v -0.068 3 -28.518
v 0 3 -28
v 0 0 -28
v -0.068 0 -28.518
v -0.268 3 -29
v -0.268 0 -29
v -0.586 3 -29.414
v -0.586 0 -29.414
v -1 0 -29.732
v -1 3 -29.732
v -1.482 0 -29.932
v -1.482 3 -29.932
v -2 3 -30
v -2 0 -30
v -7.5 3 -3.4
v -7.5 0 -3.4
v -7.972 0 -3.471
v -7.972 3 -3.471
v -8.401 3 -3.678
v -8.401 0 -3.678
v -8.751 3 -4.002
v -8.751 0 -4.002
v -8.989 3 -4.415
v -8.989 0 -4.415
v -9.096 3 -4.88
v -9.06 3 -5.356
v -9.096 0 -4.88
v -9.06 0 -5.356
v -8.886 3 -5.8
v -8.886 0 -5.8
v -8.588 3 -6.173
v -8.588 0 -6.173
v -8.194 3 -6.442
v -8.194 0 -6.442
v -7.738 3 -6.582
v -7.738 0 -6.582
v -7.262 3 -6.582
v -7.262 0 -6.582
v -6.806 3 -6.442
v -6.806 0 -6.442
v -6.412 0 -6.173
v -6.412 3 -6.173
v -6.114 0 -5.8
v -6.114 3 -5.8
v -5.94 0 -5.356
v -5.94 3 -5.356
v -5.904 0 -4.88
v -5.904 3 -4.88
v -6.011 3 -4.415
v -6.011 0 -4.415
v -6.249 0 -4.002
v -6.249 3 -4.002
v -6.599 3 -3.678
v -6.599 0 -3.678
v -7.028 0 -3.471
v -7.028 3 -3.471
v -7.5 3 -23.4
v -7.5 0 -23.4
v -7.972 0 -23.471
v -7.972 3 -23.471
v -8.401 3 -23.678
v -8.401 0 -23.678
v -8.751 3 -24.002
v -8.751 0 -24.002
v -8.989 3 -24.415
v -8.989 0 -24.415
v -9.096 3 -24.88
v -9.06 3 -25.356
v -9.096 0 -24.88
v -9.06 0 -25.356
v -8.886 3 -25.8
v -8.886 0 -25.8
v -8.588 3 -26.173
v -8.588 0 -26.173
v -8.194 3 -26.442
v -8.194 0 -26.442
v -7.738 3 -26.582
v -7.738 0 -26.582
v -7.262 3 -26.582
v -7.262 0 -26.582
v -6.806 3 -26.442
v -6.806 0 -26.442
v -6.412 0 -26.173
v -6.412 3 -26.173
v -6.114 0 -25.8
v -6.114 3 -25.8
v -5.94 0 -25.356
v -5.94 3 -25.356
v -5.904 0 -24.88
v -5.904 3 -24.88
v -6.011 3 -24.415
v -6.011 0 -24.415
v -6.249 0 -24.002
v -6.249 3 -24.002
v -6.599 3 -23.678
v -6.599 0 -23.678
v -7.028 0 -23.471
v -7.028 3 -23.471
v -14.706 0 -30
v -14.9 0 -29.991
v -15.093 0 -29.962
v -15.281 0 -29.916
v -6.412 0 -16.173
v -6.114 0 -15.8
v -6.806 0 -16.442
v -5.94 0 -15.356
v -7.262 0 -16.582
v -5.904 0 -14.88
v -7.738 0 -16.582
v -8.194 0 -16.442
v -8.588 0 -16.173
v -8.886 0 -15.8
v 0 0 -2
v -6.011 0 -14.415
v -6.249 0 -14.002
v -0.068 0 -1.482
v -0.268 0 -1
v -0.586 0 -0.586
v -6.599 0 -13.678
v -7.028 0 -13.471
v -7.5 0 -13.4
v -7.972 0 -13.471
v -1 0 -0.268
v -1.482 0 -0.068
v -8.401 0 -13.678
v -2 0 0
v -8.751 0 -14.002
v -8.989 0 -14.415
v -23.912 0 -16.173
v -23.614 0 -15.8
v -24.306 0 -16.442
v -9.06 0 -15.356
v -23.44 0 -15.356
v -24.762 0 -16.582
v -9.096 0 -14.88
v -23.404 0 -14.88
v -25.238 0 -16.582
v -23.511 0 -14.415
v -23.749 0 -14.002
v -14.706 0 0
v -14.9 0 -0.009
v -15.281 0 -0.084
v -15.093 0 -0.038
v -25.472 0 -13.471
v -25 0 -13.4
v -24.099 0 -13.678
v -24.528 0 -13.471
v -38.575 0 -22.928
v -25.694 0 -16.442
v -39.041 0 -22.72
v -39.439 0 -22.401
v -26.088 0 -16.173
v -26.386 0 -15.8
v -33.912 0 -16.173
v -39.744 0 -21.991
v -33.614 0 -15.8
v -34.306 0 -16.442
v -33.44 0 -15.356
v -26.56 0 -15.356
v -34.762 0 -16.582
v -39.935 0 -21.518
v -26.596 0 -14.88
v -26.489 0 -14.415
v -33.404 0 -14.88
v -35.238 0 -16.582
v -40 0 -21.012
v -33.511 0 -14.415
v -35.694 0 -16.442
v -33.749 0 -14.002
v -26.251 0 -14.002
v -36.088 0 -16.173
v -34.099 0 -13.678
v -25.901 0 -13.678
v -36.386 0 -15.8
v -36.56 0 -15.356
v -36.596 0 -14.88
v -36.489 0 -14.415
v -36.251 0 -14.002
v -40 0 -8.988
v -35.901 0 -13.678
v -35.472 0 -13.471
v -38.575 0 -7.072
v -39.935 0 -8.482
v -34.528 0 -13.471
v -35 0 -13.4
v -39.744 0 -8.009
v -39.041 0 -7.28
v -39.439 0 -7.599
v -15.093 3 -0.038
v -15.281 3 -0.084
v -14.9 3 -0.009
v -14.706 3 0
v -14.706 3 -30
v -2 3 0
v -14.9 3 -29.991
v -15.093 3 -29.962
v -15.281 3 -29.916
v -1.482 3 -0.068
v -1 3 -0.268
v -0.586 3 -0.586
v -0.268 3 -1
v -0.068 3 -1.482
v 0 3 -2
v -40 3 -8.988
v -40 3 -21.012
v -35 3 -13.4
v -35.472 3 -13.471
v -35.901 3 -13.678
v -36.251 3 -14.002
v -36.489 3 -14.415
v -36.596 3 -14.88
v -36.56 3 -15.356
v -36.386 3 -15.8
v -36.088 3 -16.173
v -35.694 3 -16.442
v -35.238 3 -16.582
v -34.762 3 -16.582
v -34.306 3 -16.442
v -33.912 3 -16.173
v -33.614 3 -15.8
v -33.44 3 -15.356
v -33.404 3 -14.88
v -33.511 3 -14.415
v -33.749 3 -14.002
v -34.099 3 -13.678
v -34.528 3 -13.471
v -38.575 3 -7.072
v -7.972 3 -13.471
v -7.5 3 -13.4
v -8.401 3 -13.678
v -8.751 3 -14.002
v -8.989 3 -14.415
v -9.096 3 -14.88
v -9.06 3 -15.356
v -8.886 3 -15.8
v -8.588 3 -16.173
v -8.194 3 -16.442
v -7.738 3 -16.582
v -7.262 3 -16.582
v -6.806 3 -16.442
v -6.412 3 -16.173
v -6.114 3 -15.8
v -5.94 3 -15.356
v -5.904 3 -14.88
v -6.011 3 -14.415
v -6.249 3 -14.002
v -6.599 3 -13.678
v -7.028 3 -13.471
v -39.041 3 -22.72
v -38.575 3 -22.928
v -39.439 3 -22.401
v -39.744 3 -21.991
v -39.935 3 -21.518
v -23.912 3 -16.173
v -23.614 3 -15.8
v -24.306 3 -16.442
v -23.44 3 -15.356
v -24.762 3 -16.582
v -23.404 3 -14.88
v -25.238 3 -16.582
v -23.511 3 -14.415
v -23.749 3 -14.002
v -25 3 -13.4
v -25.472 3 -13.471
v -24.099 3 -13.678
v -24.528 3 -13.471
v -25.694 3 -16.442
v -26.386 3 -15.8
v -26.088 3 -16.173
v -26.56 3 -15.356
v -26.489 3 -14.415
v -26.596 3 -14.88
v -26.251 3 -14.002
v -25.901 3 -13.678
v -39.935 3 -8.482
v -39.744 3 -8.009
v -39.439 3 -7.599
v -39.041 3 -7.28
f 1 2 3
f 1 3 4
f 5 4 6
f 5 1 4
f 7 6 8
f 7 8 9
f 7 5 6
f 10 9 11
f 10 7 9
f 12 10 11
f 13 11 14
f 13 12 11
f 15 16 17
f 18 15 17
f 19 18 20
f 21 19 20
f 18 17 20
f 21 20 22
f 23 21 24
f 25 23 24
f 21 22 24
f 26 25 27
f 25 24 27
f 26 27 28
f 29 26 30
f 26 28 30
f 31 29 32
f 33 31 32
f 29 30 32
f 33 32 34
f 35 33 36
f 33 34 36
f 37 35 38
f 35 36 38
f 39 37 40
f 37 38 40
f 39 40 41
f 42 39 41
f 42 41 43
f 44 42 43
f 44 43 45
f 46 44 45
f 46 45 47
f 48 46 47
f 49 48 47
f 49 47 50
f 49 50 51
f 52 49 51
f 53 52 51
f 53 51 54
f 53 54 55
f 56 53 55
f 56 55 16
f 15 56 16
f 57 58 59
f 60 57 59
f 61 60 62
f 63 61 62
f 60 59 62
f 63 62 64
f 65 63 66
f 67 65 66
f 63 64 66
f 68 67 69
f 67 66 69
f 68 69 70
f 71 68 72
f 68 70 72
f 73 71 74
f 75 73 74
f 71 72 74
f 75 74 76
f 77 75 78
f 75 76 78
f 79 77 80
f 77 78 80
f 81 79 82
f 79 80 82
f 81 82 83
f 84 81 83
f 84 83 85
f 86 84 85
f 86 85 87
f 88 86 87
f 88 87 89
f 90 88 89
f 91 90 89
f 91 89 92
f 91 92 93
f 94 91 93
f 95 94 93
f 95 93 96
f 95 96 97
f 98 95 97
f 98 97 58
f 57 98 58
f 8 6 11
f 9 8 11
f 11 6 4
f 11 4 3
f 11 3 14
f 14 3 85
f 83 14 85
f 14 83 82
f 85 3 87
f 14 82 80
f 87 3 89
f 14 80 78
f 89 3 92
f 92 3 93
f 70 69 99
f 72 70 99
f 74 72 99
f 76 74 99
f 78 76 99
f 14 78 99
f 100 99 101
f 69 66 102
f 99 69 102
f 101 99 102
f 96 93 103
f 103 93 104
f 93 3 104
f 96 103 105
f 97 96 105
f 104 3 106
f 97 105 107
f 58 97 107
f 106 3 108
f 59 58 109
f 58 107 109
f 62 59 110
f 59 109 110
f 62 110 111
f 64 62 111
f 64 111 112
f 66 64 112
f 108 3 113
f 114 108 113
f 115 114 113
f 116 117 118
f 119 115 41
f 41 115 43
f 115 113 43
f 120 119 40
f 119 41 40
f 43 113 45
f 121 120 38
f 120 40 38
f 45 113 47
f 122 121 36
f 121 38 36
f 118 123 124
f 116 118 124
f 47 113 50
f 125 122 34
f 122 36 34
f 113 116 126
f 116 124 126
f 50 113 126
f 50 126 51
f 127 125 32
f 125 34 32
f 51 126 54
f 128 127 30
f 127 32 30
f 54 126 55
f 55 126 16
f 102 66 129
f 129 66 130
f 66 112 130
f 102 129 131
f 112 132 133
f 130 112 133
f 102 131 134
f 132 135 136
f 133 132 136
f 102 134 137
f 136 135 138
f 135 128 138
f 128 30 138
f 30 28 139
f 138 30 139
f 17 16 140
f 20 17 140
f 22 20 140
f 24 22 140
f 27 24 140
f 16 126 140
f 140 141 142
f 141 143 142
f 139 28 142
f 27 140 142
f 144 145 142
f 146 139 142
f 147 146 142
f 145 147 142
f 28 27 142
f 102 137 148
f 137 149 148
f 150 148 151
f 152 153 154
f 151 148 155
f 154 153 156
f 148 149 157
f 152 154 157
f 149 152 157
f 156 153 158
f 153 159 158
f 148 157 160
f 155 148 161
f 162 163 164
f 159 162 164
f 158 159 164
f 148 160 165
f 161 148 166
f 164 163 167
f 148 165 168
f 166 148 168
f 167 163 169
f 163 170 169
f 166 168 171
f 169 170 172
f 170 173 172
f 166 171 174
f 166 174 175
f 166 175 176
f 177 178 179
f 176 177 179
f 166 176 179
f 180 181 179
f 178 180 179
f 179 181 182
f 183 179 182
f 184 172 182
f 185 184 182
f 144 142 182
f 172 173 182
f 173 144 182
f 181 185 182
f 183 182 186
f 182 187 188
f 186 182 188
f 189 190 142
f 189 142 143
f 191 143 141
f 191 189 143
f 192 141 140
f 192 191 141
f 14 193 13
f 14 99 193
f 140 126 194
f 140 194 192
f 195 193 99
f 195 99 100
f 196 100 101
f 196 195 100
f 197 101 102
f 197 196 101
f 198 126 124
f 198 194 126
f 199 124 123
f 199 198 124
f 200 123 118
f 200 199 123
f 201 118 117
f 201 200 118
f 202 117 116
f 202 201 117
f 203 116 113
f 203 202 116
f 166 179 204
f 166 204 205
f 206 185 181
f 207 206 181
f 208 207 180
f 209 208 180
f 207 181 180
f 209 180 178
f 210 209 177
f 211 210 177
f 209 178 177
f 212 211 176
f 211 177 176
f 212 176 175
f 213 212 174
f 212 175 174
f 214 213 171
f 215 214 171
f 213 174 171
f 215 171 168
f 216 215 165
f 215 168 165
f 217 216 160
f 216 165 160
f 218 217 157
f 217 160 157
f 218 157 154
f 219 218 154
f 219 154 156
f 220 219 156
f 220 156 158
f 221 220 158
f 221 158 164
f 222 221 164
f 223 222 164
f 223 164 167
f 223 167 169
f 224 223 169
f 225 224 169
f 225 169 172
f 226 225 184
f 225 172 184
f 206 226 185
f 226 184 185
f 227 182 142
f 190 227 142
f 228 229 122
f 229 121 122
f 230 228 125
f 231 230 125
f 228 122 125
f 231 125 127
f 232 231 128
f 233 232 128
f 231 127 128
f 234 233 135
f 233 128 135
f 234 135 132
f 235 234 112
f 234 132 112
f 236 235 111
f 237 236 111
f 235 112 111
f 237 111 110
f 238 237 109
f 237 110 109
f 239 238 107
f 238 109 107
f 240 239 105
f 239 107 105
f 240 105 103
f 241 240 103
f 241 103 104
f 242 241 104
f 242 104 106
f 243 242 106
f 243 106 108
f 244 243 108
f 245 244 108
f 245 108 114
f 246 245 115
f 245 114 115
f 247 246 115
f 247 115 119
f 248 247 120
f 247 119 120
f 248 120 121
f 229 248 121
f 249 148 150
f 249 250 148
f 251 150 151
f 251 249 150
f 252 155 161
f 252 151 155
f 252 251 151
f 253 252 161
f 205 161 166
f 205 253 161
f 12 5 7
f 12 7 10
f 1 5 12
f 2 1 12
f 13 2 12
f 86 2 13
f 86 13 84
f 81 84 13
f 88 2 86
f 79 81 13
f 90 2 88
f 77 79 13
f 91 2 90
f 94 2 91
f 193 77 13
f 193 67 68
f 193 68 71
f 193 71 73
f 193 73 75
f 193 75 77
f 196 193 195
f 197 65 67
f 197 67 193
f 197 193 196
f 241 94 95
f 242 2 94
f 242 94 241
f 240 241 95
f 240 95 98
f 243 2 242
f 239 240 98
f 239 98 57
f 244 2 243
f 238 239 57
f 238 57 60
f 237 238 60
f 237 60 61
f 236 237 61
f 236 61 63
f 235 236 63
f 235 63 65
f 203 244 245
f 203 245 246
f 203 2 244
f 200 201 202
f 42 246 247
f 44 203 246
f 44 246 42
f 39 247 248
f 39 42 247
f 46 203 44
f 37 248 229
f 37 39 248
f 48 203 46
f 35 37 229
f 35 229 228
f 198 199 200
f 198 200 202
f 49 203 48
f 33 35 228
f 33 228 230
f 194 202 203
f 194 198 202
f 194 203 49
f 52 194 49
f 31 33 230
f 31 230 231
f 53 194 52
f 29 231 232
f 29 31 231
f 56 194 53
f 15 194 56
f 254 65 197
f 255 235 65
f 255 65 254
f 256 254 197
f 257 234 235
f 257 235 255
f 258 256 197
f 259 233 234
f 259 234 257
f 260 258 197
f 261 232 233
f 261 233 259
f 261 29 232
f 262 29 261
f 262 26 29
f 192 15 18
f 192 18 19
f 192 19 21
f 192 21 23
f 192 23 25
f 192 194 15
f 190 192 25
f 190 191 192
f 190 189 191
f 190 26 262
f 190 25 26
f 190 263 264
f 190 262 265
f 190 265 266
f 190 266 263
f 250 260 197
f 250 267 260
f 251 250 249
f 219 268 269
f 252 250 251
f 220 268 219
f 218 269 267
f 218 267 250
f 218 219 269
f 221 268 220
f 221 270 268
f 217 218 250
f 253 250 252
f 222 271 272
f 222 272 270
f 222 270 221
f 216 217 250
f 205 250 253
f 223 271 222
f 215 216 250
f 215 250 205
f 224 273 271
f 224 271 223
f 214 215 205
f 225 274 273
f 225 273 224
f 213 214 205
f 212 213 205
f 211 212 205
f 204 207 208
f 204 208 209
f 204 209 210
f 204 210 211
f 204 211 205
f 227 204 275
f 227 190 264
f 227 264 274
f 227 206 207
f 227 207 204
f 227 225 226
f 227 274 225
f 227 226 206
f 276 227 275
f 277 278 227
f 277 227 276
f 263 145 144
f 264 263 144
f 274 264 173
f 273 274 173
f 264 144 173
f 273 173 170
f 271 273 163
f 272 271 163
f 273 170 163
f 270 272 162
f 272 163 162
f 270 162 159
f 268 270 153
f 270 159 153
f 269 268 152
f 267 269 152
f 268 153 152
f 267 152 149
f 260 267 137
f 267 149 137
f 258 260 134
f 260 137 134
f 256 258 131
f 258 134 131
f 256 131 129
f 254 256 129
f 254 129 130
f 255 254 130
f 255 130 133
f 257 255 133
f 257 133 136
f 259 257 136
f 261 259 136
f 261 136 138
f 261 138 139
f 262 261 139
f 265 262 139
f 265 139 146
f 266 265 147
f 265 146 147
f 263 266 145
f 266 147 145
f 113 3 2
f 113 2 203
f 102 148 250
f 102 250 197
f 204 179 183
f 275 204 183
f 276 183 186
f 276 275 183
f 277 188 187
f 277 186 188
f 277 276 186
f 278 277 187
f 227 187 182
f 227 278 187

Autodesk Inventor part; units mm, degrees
ref_plane "YZ Plane" through (0, 0, 0) normal (1, 0, 0) x (0, 1, 0)
ref_plane "XZ Plane" through (0, 0, 0) normal (0, 1, 0) x (-1, 0, 0)
ref_plane "XY Plane" through (0, 0, 0) normal (0, 0, 1) x (1, 0, 0)
sketch "スケッチ1" plane through (0, 0, 0) normal (0, 1, 0) x (-1, 0, 0)
  line L0 (0, 0) -> (15, 0)
  line L1 (40, 0) -> (40, -7.5) construction
  line L2 (40, -30) -> (15, -30) construction
  line L3 (0, -30) -> (0, 0)
  line L4 (40, -7.5) -> (40, -22.5)
  line L5 (40, -7.5) -> (55, -7.5) construction
  line L6 (40, -22.5) -> (15, -30)
  line L7 (40, -7.5) -> (15, 0)
  line L8 (15, 0) -> (40, 0) construction
  line L9 (40, -7.5) -> (40, -22.5)
  line L10 (40, -22.5) -> (40, -30) construction
  line L11 (15, -30) -> (0, -30)
  dimension "d0" = 40
  dimension "d1" = 30
  dimension "d2" = 7.5
  dimension "d3" = 15
  dimension "d4" = 90
  dimension "d5" = 15
  dimension "d6" = 15
extrude "押し出し1" add sketch "スケッチ1" along normal blind 3
sketch "スケッチ2" plane through (0, 3, 0) normal (0, 1, 0) x (1, 0, 0)
  line L0 (0, 0) -> (0, 30) projected
  line L1 (-15, 0) -> (0, 0) projected
  point P0 (-35, 15)
  point P1 (-35, 15)
  point P2 (-25, 15)
  point P3 (-7.5, 15)
  point P4 (-7.5, 5)
  point P5 (-7.5, 25)
  dimension "d9" = 35
  dimension "d10" = 15
  dimension "d11" = 10
  dimension "d12" = 7.5
  dimension "d13" = 15
  dimension "d14" = 10
  dimension "d15" = 10
hole "穴1" at (-35, 3, -15) at (-25, 3, -15) at (-7.5, 3, -15) at (-7.5, 3, -5) at (-7.5, 3, -25) direction (0, -1, 0) diameter 3.2 end through all
fillet "フィレット1" radius 2 6 edges at (-15, 1.5, 0) (0, 1.5, 0) (0, 1.5, -30) (-40, 1.5, -7.5) (-40, 1.5, -22.5) (-15, 1.5, -30)
properties part number "射出_固定5" material "アルミニウム 6061"
